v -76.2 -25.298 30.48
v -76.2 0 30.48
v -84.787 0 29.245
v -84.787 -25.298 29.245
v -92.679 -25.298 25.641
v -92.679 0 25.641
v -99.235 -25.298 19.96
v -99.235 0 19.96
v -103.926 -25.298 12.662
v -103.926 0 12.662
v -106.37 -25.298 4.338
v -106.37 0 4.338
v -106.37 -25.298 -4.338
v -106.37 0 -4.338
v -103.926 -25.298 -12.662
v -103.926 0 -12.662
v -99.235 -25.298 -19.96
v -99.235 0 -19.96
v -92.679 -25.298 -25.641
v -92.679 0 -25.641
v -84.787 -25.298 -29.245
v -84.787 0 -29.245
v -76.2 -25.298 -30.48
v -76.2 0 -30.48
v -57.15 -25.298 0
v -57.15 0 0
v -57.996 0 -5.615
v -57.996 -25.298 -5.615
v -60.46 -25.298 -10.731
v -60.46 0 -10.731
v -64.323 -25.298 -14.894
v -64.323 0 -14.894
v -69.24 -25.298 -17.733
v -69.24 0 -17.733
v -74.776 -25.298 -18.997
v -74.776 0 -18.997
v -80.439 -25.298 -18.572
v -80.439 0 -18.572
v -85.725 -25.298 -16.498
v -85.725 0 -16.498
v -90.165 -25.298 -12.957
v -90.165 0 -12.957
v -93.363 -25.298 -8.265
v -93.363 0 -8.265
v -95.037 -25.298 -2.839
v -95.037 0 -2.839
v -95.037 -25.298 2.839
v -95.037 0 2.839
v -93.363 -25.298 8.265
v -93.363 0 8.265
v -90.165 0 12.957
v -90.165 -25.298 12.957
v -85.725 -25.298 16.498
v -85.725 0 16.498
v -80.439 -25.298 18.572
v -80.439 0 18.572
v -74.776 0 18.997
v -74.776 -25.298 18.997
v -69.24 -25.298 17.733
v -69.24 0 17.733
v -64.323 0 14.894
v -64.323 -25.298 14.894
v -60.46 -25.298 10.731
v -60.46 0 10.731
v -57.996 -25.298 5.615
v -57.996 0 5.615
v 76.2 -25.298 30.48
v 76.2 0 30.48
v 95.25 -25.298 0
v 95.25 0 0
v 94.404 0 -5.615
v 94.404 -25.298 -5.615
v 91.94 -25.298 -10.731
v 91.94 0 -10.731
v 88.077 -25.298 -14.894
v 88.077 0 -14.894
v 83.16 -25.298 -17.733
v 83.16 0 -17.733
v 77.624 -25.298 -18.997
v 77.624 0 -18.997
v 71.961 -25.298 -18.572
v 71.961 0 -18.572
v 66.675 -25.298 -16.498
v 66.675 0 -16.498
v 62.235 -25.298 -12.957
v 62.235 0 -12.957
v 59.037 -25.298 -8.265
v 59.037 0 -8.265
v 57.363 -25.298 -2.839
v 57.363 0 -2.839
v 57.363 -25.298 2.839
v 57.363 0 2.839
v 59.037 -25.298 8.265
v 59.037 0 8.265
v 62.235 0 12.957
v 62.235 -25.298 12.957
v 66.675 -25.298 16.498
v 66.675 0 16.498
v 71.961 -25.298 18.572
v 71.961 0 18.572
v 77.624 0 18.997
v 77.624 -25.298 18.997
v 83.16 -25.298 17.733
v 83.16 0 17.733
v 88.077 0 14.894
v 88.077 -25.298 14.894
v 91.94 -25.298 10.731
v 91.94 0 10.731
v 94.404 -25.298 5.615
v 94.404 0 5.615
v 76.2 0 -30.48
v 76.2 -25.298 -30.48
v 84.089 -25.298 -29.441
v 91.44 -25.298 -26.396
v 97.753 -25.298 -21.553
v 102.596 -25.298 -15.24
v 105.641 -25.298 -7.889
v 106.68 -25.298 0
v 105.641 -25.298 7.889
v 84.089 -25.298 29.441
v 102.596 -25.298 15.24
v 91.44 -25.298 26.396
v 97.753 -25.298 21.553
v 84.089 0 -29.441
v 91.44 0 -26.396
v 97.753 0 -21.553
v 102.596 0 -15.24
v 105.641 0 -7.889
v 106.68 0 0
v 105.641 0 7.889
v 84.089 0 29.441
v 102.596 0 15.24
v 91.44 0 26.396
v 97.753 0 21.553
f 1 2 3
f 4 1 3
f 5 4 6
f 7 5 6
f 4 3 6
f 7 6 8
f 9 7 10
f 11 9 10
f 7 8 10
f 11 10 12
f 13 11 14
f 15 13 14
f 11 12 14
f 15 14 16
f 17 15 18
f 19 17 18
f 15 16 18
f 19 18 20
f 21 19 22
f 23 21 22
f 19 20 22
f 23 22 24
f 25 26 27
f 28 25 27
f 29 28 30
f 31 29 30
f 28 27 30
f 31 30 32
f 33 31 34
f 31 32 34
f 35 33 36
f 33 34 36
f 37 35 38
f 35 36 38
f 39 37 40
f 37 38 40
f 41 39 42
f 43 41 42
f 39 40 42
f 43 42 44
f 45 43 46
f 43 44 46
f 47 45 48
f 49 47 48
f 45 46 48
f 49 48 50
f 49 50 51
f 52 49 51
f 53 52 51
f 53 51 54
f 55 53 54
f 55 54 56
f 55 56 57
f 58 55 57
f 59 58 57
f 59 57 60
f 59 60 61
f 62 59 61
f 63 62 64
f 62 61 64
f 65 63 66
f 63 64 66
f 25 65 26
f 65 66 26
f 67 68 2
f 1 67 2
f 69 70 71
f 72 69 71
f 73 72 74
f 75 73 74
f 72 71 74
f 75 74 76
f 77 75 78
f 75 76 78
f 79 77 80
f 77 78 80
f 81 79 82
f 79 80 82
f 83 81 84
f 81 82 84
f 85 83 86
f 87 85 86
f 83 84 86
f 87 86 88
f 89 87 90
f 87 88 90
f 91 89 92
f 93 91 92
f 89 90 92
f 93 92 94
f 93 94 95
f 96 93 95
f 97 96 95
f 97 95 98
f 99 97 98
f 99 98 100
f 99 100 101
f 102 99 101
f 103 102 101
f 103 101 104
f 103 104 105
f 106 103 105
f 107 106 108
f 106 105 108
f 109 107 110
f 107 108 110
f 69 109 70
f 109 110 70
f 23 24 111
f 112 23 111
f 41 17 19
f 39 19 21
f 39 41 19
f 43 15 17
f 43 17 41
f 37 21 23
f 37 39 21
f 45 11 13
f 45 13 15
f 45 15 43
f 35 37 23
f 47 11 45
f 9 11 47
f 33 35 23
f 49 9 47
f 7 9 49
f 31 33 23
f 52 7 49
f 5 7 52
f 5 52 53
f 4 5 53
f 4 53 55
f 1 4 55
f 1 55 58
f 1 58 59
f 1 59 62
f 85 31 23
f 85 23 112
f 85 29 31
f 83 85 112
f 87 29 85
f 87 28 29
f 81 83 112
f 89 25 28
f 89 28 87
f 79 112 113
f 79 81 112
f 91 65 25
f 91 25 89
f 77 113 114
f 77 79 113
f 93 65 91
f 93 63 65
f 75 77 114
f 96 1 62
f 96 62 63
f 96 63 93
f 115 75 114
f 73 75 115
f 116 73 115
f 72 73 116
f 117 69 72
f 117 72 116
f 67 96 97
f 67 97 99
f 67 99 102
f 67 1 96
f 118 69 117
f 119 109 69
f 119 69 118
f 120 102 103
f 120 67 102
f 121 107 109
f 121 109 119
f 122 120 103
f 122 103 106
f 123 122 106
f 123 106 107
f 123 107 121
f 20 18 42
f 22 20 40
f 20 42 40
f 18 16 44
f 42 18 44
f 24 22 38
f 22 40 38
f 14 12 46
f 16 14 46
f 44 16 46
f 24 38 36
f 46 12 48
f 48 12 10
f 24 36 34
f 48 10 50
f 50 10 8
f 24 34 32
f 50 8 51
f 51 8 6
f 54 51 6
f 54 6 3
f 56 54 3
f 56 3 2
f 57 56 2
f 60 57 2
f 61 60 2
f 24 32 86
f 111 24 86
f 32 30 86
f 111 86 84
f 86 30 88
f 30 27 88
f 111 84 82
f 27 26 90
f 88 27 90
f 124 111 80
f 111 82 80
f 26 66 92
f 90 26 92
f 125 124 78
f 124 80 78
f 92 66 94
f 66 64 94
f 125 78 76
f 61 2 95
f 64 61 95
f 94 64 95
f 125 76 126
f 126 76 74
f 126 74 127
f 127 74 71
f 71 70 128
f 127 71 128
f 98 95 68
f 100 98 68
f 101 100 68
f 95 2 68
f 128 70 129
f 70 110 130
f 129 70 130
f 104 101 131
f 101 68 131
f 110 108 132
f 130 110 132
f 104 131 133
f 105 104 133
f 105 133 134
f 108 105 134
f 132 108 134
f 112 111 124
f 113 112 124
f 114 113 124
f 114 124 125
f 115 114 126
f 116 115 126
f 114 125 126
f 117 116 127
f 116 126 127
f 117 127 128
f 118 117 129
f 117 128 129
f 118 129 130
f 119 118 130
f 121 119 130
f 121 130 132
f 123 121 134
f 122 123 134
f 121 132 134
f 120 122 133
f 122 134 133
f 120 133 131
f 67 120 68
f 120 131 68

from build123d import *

# Parameters (mm, degrees)
F1_DEPTH = 25.2984


with BuildPart() as f1:
    # F0 (on Front) → F1 (new body)
    with BuildSketch(Plane.XZ):
        with BuildLine():
            ThreePointArc((76.2, -30.48), (45.72, 0), (76.2, 30.48))
            Line((76.2, 30.48), (-76.2, 30.48))
            ThreePointArc((-76.2, 30.48), (-54.6473853094, 21.5526146906), (-45.72, 0))
            ThreePointArc((-45.72, 0), (-54.6473853094, -21.5526146906), (-76.2, -30.48))
            Line((-76.2, -30.48), (76.2, -30.48))
        make_face()
        with BuildLine():
            ThreePointArc((106.68, 0), (97.7526146906, 21.5526146906), (76.2, 30.48))
            Line((76.2, 30.48), (76.2, 19.05))
            ThreePointArc((76.2, 19.05), (89.6703841816, 13.4703841816), (95.25, 0))
            ThreePointArc((95.25, 0), (89.6703841816, -13.4703841816), (76.2, -19.05))
            Line((76.2, -19.05), (76.2, -30.48))
            ThreePointArc((76.2, -30.48), (97.7526146906, -21.5526146906), (106.68, 0))
        make_face()
        with BuildLine():
            Line((76.2, 19.05), (76.2, 30.48))
            ThreePointArc((76.2, 30.48), (45.72, 0), (76.2, -30.48))
            Line((76.2, -30.48), (76.2, -19.05))
            ThreePointArc((76.2, -19.05), (57.15, 0), (76.2, 19.05))
        make_face()
        with BuildLine():
            ThreePointArc((-45.72, 0), (-54.6473853094, 21.5526146906), (-76.2, 30.48))
            Line((-76.2, 30.48), (-76.2, 19.05))
            ThreePointArc((-76.2, 19.05), (-62.7296158184, 13.4703841816), (-57.15, 0))
            ThreePointArc((-57.15, 0), (-62.7296158184, -13.4703841816), (-76.2, -19.05))
            Line((-76.2, -19.05), (-76.2, -30.48))
            ThreePointArc((-76.2, -30.48), (-54.6473853094, -21.5526146906), (-45.72, 0))
        make_face()
        with BuildLine():
            Line((-76.2, 19.05), (-76.2, 30.48))
            ThreePointArc((-76.2, 30.48), (-106.68, 0), (-76.2, -30.48))
            Line((-76.2, -30.48), (-76.2, -19.05))
            ThreePointArc((-76.2, -19.05), (-95.25, 0), (-76.2, 19.05))
        make_face()
    extrude(amount=F1_DEPTH)


solid = f1.part
